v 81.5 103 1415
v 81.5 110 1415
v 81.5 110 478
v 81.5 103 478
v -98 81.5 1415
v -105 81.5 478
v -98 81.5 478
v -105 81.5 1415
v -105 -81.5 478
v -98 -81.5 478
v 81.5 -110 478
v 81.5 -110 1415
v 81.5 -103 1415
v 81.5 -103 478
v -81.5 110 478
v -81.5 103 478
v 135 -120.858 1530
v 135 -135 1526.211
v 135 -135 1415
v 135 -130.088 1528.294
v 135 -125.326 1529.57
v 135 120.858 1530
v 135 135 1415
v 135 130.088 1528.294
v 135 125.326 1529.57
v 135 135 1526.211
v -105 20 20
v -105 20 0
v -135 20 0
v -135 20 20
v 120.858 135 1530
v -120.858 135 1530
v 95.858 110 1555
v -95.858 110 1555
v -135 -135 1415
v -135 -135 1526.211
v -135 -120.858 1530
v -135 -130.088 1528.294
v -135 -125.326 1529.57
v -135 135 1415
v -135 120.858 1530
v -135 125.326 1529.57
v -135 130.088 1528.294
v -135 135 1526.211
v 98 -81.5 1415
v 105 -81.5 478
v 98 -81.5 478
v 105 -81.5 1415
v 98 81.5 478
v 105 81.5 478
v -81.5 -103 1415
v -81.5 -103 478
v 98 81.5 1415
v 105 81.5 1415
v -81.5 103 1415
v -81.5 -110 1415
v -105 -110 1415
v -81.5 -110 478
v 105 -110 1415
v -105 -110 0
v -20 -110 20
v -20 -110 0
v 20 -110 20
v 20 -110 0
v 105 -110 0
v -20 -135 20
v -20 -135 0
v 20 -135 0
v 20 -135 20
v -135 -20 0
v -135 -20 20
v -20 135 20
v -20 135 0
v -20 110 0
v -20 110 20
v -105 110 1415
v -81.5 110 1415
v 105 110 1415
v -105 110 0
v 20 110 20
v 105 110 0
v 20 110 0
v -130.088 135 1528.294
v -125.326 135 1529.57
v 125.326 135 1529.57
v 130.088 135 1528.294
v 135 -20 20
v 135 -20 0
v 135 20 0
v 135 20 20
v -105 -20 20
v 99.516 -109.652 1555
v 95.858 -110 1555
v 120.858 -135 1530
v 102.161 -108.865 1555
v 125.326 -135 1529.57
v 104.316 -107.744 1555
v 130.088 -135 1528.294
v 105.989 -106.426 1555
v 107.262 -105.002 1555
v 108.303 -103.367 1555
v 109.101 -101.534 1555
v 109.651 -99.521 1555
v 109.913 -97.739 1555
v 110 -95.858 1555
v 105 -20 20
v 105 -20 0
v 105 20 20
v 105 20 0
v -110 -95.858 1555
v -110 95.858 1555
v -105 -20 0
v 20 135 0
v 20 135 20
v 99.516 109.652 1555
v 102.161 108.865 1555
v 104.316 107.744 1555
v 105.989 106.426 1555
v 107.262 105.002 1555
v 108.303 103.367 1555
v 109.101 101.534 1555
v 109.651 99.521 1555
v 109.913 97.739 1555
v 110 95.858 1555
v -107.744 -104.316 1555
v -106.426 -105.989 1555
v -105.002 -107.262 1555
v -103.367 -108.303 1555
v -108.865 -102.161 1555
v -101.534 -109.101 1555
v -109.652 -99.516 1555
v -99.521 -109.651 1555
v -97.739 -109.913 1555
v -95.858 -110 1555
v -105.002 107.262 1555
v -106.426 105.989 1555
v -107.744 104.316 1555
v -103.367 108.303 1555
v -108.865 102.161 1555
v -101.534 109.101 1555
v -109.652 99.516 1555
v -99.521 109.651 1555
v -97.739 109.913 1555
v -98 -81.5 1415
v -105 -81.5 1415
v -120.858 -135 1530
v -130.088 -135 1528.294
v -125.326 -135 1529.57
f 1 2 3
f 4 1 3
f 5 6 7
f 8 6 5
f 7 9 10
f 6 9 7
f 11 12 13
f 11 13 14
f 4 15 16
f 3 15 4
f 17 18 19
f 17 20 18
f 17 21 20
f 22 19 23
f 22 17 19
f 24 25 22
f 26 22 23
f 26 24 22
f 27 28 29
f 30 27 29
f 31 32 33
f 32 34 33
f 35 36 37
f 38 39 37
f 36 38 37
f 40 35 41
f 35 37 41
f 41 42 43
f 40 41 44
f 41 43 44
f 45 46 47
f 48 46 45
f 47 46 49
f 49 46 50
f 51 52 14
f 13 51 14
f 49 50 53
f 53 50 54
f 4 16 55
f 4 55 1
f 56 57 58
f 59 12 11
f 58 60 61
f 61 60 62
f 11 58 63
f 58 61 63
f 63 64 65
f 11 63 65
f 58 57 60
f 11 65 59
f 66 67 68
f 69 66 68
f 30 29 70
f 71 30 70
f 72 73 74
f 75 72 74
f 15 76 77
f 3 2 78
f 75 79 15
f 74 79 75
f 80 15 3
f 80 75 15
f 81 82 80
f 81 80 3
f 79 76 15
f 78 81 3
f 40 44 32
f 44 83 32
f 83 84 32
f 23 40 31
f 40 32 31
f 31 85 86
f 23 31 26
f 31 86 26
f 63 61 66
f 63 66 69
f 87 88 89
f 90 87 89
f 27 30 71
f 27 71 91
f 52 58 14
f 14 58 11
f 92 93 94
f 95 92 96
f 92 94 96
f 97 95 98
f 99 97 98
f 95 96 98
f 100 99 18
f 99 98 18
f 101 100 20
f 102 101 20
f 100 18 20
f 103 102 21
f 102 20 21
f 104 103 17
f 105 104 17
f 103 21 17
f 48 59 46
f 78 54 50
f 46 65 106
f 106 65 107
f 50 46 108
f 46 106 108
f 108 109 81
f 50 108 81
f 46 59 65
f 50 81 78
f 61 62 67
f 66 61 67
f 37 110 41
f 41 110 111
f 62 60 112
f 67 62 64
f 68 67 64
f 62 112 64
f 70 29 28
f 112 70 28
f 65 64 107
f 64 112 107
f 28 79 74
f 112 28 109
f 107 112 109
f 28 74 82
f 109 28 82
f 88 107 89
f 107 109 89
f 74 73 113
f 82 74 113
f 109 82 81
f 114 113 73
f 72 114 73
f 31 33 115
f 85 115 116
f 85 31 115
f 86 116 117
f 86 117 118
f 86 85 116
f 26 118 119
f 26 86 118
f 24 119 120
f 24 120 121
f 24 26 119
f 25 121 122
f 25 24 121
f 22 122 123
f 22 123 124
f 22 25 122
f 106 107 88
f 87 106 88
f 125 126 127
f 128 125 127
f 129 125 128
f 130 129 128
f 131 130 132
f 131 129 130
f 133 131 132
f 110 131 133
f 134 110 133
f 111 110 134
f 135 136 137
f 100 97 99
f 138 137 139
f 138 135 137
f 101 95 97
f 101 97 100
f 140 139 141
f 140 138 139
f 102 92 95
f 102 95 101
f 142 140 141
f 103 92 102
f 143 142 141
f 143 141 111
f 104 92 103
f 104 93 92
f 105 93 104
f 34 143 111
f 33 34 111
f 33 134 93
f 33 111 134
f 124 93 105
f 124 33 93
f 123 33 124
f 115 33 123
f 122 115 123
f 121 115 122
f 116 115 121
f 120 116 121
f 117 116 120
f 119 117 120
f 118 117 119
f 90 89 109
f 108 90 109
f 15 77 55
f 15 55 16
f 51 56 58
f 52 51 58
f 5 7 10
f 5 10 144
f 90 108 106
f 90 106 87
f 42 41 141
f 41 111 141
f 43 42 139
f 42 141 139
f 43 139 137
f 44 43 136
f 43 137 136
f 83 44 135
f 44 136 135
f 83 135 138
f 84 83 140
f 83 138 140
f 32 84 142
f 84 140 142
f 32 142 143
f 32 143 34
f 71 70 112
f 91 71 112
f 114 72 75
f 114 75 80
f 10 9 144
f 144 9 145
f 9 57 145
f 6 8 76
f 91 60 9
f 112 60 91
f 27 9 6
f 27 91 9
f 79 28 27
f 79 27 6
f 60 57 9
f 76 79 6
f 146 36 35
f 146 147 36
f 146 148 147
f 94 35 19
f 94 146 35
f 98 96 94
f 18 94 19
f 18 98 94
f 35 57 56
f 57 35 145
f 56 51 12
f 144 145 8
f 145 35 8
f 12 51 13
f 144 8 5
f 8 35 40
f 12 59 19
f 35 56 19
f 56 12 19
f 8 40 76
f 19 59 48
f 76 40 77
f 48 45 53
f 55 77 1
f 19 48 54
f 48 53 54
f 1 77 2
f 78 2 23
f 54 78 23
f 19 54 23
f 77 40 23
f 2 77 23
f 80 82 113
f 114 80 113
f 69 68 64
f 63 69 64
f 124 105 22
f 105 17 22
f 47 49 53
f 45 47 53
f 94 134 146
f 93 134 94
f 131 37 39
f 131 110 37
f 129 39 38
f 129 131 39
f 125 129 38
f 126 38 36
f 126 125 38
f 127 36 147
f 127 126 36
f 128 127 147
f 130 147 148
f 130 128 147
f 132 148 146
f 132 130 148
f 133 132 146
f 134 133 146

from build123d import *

# Parameters (mm, degrees)
SKETCH1_W           = 210
SKETCH1_H           = 220
BOSS_EXTRUDE1_DEPTH = 1555
SKETCH2_W           = 937
SKETCH2_H           = 163
CUT_EXTRUDE1_DEPTH  = 7
SKETCH4_W           = 163
SKETCH4_H           = 937
CUT_EXTRUDE2_DEPTH  = 7
SKETCH5_W           = 270
SKETCH5_H           = 270
BOSS_EXTRUDE2_DEPTH = 140
CHAMFER1_SIZE       = 25
FILLET1_R           = 20
BOSS_EXTRUDE3_DEPTH = 20


with BuildPart() as part:
    # Sketch1 → Boss-Extrude1 (new body)
    with BuildSketch(Plane.XY):
        Rectangle(SKETCH1_W, SKETCH1_H)
    extrude(amount=BOSS_EXTRUDE1_DEPTH)

    # Sketch2 → Cut-Extrude1 (cut)
    with BuildSketch(Plane.ZY.offset(105)):
        with Locations((946.5, 0)):
            Rectangle(SKETCH2_W, SKETCH2_H)
    cut_extrude1 = extrude(amount=-CUT_EXTRUDE1_DEPTH, mode=Mode.SUBTRACT)

    # Mirror2: Cut-Extrude1 across plane
    add(cut_extrude1.mirror(Plane(origin=(0, 0, 0), x_dir=(0, 0, 1), z_dir=(1, 0, 0))), mode=Mode.SUBTRACT)

    # Sketch4 → Cut-Extrude2 (cut)
    with BuildSketch(Plane(origin=(0, 110, 0), x_dir=(1, 0, 0), z_dir=(0, 1, 0))):
        with Locations((0, -946.5)):
            Rectangle(SKETCH4_W, SKETCH4_H)
    cut_extrude2 = extrude(amount=-CUT_EXTRUDE2_DEPTH, mode=Mode.SUBTRACT)

    # Mirror3: Cut-Extrude2 across plane
    add(cut_extrude2.mirror(Plane.ZX), mode=Mode.SUBTRACT)

    # Sketch5 → Boss-Extrude2 (add)
    with BuildSketch(Plane.XY.offset(1555)):
        Rectangle(SKETCH5_W, SKETCH5_H)
    extrude(amount=-BOSS_EXTRUDE2_DEPTH)

    # Chamfer1
    chamfer1_edges = [part.edges().sort_by_distance(p)[0] for p in [
        (135, 0, 1555),
        (0, 135, 1555),
        (-135, 0, 1555),
        (0, -135, 1555),
    ]]
    chamfer(chamfer1_edges, length=CHAMFER1_SIZE)

    # Fillet1
    fillet1_edges = [part.edges().sort_by_distance(p)[0] for p in [
        (122.5, 122.5, 1542.5),
        (122.5, -122.5, 1542.5),
        (-122.5, 122.5, 1542.5),
        (-122.5, -122.5, 1542.5),
    ]]
    fillet(fillet1_edges, radius=FILLET1_R)

    # Sketch6 → Boss-Extrude3 (add)
    with BuildSketch(Plane(origin=(0, 0, 0), x_dir=(-1, 0, 0), z_dir=(0, 0, -1))):
        Polygon((-20, 135), (20, 135), (20, 20), (135, 20), (135, -20), (20, -20), (20, -135), (-20, -135), (-20, -20), (-135, -20), (-135, 20), (-20, 20), align=None)
    extrude(amount=-BOSS_EXTRUDE3_DEPTH)


solid = part.part
